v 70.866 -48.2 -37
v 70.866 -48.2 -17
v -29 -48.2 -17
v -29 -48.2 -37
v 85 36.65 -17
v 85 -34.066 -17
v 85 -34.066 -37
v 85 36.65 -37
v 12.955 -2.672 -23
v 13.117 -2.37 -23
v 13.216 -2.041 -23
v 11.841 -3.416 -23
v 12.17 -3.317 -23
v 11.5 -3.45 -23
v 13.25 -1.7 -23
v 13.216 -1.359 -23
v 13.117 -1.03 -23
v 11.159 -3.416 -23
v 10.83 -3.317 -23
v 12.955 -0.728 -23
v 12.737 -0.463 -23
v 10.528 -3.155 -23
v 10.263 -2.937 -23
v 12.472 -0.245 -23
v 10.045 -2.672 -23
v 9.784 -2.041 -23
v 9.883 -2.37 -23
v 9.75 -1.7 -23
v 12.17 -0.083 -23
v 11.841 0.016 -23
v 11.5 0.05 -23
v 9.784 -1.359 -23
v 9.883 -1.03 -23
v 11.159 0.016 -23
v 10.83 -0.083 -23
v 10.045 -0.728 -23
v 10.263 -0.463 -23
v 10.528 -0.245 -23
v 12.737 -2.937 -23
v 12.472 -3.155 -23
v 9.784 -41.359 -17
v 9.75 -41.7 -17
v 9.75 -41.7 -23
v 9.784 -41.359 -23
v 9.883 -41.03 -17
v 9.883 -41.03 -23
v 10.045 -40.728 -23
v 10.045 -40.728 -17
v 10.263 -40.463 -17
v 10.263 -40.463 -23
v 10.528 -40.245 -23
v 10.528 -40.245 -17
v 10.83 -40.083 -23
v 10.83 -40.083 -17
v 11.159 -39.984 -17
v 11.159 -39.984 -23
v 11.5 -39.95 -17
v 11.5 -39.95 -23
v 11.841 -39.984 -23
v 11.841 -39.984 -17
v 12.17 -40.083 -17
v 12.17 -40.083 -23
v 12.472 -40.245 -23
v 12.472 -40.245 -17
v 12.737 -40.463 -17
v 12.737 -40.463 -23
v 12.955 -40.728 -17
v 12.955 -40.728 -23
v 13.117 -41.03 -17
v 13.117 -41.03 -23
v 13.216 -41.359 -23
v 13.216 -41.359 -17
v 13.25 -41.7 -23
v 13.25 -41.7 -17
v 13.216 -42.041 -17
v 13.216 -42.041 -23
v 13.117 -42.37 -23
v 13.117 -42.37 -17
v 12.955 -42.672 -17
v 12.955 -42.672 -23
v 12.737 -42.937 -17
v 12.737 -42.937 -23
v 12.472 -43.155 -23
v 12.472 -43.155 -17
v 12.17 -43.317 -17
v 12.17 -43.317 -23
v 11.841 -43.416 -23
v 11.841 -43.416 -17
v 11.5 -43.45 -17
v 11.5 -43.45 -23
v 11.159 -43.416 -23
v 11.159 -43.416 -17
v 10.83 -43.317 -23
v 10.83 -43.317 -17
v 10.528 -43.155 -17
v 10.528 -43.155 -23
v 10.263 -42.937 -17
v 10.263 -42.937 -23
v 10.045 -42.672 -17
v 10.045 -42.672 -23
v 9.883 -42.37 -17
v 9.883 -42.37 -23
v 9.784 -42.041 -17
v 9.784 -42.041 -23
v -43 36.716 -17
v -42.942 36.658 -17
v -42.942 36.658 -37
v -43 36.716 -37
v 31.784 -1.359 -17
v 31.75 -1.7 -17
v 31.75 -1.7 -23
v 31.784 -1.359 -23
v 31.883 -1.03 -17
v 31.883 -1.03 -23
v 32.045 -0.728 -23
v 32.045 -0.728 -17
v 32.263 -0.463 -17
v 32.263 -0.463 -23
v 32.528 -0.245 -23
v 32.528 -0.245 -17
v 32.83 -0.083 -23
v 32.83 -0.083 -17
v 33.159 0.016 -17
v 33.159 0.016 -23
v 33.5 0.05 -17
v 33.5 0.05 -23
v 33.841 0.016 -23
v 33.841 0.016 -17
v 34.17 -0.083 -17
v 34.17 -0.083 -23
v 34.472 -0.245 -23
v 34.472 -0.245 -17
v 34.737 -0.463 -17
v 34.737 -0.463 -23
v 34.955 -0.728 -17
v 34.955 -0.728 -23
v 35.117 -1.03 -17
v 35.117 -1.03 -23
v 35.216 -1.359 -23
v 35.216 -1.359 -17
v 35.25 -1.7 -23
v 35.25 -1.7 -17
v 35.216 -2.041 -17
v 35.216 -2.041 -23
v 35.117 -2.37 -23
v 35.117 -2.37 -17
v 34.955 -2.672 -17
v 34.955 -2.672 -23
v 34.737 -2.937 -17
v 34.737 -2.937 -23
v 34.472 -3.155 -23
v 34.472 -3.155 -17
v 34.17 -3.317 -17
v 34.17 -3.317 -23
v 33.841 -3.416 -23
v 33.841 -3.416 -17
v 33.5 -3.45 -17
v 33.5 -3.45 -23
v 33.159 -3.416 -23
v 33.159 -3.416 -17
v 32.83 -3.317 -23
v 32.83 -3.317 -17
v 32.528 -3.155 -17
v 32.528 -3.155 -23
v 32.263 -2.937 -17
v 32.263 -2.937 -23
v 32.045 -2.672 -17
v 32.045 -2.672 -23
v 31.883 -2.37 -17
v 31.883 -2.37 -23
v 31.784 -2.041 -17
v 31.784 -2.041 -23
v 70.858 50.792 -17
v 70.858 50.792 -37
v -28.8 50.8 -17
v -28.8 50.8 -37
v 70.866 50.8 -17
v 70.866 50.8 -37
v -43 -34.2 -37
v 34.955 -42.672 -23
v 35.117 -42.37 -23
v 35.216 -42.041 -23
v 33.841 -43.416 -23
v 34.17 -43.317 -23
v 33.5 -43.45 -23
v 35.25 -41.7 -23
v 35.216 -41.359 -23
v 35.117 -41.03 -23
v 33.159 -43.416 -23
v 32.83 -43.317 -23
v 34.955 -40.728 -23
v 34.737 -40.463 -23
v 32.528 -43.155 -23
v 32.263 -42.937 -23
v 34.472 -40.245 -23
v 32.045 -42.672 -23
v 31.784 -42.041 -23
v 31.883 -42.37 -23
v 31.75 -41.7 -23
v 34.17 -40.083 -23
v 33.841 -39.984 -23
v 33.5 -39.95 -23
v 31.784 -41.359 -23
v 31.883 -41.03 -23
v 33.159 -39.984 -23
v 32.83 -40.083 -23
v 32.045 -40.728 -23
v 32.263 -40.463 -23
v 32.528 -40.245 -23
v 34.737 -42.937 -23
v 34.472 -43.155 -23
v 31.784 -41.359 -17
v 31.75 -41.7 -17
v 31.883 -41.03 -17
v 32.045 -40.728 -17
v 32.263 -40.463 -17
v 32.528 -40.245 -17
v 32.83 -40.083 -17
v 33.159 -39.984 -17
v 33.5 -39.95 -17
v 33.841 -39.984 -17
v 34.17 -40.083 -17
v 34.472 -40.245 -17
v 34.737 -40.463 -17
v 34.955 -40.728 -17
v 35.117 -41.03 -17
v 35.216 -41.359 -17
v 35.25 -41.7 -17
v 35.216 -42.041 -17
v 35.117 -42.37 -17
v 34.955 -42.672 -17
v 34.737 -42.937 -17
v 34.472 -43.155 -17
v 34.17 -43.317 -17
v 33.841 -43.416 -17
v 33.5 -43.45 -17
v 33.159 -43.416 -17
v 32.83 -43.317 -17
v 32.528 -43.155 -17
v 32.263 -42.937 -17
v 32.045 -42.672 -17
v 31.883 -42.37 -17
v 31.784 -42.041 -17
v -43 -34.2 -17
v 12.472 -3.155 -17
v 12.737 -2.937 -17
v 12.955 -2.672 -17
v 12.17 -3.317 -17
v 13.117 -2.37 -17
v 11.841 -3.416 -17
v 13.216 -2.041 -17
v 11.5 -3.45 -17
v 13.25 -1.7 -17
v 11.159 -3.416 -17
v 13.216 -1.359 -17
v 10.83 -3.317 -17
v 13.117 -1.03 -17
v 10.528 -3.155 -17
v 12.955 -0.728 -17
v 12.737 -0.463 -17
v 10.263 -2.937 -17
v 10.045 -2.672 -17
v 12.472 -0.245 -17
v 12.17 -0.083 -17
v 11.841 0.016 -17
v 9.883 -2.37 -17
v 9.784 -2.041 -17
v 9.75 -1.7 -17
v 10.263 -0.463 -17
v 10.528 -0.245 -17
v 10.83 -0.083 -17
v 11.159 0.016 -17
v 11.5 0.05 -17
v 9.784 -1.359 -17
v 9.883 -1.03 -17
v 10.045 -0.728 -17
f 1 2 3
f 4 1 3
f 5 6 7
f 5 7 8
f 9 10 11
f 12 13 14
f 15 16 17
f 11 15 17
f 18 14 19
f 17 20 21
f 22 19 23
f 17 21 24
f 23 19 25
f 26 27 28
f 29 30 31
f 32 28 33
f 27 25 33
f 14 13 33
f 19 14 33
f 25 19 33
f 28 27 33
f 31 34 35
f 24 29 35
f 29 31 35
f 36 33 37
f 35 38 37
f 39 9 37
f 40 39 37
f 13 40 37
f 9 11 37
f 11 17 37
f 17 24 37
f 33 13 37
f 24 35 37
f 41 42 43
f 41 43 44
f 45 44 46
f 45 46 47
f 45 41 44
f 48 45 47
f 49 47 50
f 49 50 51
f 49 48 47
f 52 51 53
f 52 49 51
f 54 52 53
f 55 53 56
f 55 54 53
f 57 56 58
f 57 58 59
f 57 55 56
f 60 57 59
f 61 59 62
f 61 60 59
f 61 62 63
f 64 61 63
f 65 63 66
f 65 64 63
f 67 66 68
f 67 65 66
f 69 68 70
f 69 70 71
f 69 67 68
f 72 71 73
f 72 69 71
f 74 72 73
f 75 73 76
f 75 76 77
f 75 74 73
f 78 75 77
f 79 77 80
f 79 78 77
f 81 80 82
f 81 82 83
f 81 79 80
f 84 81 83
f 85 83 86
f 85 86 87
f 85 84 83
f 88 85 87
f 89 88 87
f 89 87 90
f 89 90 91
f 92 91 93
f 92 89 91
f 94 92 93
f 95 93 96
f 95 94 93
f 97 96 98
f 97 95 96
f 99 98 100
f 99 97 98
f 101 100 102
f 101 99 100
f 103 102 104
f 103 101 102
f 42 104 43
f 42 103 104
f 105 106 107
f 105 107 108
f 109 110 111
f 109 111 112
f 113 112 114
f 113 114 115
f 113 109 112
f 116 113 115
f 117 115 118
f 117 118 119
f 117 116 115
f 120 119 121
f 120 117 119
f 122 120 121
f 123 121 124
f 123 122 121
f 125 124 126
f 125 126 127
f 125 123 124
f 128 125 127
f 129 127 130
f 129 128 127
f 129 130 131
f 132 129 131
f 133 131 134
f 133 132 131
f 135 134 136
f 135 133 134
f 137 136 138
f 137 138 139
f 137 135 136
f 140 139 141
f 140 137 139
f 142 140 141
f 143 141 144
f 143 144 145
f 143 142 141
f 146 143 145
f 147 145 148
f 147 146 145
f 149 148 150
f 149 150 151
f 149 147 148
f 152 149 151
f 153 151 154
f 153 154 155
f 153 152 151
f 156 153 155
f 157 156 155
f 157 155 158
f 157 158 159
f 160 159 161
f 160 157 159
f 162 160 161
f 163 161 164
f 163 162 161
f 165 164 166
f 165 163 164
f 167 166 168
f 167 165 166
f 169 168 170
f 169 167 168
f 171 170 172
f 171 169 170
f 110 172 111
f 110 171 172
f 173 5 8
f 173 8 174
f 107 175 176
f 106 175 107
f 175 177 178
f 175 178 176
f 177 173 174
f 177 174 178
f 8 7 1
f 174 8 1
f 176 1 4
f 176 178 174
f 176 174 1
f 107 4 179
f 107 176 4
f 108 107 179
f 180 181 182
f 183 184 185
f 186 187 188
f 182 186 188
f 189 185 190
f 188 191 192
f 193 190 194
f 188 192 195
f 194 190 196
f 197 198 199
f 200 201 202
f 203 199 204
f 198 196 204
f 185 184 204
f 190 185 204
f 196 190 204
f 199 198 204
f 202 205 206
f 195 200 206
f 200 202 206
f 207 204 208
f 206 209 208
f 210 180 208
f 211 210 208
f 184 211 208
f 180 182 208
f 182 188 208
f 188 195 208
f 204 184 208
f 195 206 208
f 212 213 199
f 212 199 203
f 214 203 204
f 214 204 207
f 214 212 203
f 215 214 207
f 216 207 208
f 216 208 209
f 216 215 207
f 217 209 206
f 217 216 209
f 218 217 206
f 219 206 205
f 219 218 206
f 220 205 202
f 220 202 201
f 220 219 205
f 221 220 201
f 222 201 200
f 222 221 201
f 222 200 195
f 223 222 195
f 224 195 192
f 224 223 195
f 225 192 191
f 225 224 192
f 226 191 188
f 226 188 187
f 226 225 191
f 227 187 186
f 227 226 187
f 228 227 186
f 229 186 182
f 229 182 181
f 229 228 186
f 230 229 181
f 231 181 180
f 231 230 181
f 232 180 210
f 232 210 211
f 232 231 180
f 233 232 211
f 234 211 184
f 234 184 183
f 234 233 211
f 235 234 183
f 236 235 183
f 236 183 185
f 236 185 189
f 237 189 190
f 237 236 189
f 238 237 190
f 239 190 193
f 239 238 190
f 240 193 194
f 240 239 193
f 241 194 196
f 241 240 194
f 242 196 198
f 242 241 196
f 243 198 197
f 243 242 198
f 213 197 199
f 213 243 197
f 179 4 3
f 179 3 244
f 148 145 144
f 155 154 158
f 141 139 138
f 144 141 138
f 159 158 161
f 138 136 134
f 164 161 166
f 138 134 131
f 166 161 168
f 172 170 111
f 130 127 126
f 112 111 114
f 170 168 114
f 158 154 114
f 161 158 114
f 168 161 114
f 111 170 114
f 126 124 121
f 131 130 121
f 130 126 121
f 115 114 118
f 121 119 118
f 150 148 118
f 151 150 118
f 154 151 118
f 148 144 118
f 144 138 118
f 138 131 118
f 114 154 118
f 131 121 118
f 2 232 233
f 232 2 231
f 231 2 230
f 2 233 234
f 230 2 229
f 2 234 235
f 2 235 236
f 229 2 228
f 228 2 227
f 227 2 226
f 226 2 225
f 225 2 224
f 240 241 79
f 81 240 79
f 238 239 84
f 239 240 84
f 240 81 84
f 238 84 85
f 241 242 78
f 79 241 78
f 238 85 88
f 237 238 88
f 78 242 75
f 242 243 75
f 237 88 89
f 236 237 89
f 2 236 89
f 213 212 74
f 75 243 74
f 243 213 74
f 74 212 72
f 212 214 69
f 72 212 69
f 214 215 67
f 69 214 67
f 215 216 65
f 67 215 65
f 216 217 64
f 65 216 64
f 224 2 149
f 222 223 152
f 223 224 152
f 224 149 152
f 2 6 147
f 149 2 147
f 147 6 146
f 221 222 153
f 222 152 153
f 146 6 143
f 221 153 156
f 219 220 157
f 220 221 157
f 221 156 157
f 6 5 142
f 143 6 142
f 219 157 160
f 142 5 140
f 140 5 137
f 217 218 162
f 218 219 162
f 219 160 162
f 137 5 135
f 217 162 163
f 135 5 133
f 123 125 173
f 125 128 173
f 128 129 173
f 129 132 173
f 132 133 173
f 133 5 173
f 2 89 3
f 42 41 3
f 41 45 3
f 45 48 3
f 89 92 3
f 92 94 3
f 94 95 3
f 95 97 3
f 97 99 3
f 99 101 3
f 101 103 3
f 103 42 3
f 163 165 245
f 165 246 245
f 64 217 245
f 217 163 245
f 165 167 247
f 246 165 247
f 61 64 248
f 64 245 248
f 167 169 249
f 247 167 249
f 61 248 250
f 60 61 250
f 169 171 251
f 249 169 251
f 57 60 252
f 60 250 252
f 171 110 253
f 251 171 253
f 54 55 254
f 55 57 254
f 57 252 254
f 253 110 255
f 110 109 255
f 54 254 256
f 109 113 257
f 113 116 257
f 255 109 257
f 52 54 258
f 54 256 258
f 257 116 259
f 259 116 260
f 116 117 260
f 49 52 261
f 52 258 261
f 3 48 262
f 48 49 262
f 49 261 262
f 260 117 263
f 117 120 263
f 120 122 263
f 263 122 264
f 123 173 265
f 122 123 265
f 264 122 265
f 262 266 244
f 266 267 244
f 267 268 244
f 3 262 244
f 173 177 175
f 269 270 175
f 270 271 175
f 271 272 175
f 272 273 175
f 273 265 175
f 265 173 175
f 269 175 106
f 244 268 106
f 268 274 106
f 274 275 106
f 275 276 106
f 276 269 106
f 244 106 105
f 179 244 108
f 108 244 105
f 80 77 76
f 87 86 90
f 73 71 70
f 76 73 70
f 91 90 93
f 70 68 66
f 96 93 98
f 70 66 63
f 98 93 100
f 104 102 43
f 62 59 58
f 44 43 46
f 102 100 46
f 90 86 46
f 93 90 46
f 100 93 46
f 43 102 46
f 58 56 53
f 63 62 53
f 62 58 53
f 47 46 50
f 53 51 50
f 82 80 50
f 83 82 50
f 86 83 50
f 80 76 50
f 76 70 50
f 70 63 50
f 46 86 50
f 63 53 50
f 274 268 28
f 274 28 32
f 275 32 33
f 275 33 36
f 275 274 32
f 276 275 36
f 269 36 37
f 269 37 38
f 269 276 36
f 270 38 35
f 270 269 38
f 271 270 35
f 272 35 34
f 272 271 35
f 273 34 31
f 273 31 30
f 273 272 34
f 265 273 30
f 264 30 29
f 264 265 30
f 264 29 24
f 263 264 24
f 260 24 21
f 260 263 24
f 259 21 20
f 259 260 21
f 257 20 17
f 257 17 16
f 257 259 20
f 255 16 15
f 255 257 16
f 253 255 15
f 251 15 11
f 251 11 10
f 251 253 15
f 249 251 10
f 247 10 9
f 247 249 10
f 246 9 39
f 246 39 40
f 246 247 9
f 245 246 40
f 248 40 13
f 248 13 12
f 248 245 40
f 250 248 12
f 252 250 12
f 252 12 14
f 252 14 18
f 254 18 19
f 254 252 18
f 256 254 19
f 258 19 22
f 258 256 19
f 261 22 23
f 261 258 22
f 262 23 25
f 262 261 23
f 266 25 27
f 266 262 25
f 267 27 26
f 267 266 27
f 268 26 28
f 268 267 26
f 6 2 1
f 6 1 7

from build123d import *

# Parameters (mm, degrees)
CYLINDER004_R          = 1.75
CYLINDER004_DEPTH      = 6
ARRAY004_X_COUNT       = 2
ARRAY004_X_PITCH       = 22
ARRAY004_Y_COUNT       = 2
ARRAY004_Y_PITCH       = 40
BOX011_W               = 20
BOX011_H               = 20
BOX011_DEPTH           = 20
BOX011_PLACEMENT_ANGLE = 45
BOX012_W               = 20
BOX012_H               = 20
BOX012_DEPTH           = 20
BOX012_PLACEMENT_ANGLE = 45
BOX009_W               = 20
BOX009_H               = 20
BOX009_DEPTH           = 20
BOX009_PLACEMENT_ANGLE = -45
BOX010_W               = 20
BOX010_H               = 20
BOX010_DEPTH           = 20
BOX010_PLACEMENT_ANGLE = -45
BOX008_W               = 128
BOX008_H               = 99
BOX008_DEPTH           = 20
CUT005_PLACEMENT_ANGLE = 180


with BuildPart() as array004:
    # Cylinder004 → Cylinder004 (new body)
    with BuildSketch(Plane.XY):
        Circle(CYLINDER004_R)
    extrude(amount=CYLINDER004_DEPTH)

    # Array004 X: Array004 ×2


with BuildPart() as array004_1:
    add(array004.part)
    with Locations(*[(i * ARRAY004_X_PITCH, 0, 0) for i in range(1, ARRAY004_X_COUNT)]):
        add(array004.part)

    # Array004 Y: Array004 ×2


with BuildPart() as array004_2:
    add(array004_1.part)
    with Locations(*[(0, i * ARRAY004_Y_PITCH, 0) for i in range(1, ARRAY004_Y_COUNT)]):
        add(array004_1.part)


with BuildPart() as array004_3:
    # Array004 placement: moved
    add(array004_2.part.moved(Location((37.5, -8, 0))))


with BuildPart() as cubo007:
    # Box011 → Box011 (new body)
    with BuildSketch(Plane.XY):
        with Locations((10, 10)):
            Rectangle(BOX011_W, BOX011_H)
    extrude(amount=BOX011_DEPTH)


with BuildPart() as cubo007_1:
    # Box011 placement: moved
    add(cubo007.part.moved(Location((-14, -28.65, 0))).rotate(Axis((-14, -28.65, 0), (0, 0, 1)), BOX011_PLACEMENT_ANGLE))


with BuildPart() as cubo008:
    # Box012 → Box012 (new body)
    with BuildSketch(Plane.XY):
        with Locations((10, 10)):
            Rectangle(BOX012_W, BOX012_H)
    extrude(amount=BOX012_DEPTH)


with BuildPart() as cubo008_1:
    # Box012 placement: moved
    add(cubo008.part.moved(Location((-14, 70.35, 0))).rotate(Axis((-14, 70.35, 0), (0, 0, 1)), BOX012_PLACEMENT_ANGLE))


with BuildPart() as cubo005:
    # Box009 → Box009 (new body)
    with BuildSketch(Plane.XY):
        with Locations((10, 10)):
            Rectangle(BOX009_W, BOX009_H)
    extrude(amount=BOX009_DEPTH)


with BuildPart() as cubo005_1:
    # Box009 placement: moved
    add(cubo005.part.moved(Location((100, -14.5, 0))).rotate(Axis((100, -14.5, 0), (0, 0, 1)), BOX009_PLACEMENT_ANGLE))


with BuildPart() as fusion005:
    # Box010 → Box010 (new body)
    with BuildSketch(Plane.XY):
        with Locations((10, 10)):
            Rectangle(BOX010_W, BOX010_H)
    extrude(amount=BOX010_DEPTH)


with BuildPart() as fusion005_1:
    # Box010 placement: moved
    add(fusion005.part.moved(Location((99.8, 84.5, 0))).rotate(Axis((99.8, 84.5, 0), (0, 0, 1)), BOX010_PLACEMENT_ANGLE))

    # Fusion005: union Cubo007, Cubo008, Cubo005
    add(cubo007_1.part)
    add(cubo008_1.part)
    add(cubo005_1.part)


with BuildPart() as bloque_metacrilato:
    # Box008 → Box008 (new body)
    with BuildSketch(Plane(origin=(-14, -14.5, 0), x_dir=(1, 0, 0), z_dir=(0, 0, 1))):
        with Locations((64, 49.5)):
            Rectangle(BOX008_W, BOX008_H)
    extrude(amount=BOX008_DEPTH)

    # Cut004: cut Fusion005
    add(fusion005_1.part, mode=Mode.SUBTRACT)

    # Cut005: cut Array004
    add(array004_3.part, mode=Mode.SUBTRACT)


with BuildPart() as bloque_metacrilato_1:
    # Cut005 placement: moved
    add(bloque_metacrilato.part.moved(Location((71, -33.7, -17))).rotate(Axis((71, -33.7, -17), (0, 1, 0)), CUT005_PLACEMENT_ANGLE))


solid = bloque_metacrilato_1.part
